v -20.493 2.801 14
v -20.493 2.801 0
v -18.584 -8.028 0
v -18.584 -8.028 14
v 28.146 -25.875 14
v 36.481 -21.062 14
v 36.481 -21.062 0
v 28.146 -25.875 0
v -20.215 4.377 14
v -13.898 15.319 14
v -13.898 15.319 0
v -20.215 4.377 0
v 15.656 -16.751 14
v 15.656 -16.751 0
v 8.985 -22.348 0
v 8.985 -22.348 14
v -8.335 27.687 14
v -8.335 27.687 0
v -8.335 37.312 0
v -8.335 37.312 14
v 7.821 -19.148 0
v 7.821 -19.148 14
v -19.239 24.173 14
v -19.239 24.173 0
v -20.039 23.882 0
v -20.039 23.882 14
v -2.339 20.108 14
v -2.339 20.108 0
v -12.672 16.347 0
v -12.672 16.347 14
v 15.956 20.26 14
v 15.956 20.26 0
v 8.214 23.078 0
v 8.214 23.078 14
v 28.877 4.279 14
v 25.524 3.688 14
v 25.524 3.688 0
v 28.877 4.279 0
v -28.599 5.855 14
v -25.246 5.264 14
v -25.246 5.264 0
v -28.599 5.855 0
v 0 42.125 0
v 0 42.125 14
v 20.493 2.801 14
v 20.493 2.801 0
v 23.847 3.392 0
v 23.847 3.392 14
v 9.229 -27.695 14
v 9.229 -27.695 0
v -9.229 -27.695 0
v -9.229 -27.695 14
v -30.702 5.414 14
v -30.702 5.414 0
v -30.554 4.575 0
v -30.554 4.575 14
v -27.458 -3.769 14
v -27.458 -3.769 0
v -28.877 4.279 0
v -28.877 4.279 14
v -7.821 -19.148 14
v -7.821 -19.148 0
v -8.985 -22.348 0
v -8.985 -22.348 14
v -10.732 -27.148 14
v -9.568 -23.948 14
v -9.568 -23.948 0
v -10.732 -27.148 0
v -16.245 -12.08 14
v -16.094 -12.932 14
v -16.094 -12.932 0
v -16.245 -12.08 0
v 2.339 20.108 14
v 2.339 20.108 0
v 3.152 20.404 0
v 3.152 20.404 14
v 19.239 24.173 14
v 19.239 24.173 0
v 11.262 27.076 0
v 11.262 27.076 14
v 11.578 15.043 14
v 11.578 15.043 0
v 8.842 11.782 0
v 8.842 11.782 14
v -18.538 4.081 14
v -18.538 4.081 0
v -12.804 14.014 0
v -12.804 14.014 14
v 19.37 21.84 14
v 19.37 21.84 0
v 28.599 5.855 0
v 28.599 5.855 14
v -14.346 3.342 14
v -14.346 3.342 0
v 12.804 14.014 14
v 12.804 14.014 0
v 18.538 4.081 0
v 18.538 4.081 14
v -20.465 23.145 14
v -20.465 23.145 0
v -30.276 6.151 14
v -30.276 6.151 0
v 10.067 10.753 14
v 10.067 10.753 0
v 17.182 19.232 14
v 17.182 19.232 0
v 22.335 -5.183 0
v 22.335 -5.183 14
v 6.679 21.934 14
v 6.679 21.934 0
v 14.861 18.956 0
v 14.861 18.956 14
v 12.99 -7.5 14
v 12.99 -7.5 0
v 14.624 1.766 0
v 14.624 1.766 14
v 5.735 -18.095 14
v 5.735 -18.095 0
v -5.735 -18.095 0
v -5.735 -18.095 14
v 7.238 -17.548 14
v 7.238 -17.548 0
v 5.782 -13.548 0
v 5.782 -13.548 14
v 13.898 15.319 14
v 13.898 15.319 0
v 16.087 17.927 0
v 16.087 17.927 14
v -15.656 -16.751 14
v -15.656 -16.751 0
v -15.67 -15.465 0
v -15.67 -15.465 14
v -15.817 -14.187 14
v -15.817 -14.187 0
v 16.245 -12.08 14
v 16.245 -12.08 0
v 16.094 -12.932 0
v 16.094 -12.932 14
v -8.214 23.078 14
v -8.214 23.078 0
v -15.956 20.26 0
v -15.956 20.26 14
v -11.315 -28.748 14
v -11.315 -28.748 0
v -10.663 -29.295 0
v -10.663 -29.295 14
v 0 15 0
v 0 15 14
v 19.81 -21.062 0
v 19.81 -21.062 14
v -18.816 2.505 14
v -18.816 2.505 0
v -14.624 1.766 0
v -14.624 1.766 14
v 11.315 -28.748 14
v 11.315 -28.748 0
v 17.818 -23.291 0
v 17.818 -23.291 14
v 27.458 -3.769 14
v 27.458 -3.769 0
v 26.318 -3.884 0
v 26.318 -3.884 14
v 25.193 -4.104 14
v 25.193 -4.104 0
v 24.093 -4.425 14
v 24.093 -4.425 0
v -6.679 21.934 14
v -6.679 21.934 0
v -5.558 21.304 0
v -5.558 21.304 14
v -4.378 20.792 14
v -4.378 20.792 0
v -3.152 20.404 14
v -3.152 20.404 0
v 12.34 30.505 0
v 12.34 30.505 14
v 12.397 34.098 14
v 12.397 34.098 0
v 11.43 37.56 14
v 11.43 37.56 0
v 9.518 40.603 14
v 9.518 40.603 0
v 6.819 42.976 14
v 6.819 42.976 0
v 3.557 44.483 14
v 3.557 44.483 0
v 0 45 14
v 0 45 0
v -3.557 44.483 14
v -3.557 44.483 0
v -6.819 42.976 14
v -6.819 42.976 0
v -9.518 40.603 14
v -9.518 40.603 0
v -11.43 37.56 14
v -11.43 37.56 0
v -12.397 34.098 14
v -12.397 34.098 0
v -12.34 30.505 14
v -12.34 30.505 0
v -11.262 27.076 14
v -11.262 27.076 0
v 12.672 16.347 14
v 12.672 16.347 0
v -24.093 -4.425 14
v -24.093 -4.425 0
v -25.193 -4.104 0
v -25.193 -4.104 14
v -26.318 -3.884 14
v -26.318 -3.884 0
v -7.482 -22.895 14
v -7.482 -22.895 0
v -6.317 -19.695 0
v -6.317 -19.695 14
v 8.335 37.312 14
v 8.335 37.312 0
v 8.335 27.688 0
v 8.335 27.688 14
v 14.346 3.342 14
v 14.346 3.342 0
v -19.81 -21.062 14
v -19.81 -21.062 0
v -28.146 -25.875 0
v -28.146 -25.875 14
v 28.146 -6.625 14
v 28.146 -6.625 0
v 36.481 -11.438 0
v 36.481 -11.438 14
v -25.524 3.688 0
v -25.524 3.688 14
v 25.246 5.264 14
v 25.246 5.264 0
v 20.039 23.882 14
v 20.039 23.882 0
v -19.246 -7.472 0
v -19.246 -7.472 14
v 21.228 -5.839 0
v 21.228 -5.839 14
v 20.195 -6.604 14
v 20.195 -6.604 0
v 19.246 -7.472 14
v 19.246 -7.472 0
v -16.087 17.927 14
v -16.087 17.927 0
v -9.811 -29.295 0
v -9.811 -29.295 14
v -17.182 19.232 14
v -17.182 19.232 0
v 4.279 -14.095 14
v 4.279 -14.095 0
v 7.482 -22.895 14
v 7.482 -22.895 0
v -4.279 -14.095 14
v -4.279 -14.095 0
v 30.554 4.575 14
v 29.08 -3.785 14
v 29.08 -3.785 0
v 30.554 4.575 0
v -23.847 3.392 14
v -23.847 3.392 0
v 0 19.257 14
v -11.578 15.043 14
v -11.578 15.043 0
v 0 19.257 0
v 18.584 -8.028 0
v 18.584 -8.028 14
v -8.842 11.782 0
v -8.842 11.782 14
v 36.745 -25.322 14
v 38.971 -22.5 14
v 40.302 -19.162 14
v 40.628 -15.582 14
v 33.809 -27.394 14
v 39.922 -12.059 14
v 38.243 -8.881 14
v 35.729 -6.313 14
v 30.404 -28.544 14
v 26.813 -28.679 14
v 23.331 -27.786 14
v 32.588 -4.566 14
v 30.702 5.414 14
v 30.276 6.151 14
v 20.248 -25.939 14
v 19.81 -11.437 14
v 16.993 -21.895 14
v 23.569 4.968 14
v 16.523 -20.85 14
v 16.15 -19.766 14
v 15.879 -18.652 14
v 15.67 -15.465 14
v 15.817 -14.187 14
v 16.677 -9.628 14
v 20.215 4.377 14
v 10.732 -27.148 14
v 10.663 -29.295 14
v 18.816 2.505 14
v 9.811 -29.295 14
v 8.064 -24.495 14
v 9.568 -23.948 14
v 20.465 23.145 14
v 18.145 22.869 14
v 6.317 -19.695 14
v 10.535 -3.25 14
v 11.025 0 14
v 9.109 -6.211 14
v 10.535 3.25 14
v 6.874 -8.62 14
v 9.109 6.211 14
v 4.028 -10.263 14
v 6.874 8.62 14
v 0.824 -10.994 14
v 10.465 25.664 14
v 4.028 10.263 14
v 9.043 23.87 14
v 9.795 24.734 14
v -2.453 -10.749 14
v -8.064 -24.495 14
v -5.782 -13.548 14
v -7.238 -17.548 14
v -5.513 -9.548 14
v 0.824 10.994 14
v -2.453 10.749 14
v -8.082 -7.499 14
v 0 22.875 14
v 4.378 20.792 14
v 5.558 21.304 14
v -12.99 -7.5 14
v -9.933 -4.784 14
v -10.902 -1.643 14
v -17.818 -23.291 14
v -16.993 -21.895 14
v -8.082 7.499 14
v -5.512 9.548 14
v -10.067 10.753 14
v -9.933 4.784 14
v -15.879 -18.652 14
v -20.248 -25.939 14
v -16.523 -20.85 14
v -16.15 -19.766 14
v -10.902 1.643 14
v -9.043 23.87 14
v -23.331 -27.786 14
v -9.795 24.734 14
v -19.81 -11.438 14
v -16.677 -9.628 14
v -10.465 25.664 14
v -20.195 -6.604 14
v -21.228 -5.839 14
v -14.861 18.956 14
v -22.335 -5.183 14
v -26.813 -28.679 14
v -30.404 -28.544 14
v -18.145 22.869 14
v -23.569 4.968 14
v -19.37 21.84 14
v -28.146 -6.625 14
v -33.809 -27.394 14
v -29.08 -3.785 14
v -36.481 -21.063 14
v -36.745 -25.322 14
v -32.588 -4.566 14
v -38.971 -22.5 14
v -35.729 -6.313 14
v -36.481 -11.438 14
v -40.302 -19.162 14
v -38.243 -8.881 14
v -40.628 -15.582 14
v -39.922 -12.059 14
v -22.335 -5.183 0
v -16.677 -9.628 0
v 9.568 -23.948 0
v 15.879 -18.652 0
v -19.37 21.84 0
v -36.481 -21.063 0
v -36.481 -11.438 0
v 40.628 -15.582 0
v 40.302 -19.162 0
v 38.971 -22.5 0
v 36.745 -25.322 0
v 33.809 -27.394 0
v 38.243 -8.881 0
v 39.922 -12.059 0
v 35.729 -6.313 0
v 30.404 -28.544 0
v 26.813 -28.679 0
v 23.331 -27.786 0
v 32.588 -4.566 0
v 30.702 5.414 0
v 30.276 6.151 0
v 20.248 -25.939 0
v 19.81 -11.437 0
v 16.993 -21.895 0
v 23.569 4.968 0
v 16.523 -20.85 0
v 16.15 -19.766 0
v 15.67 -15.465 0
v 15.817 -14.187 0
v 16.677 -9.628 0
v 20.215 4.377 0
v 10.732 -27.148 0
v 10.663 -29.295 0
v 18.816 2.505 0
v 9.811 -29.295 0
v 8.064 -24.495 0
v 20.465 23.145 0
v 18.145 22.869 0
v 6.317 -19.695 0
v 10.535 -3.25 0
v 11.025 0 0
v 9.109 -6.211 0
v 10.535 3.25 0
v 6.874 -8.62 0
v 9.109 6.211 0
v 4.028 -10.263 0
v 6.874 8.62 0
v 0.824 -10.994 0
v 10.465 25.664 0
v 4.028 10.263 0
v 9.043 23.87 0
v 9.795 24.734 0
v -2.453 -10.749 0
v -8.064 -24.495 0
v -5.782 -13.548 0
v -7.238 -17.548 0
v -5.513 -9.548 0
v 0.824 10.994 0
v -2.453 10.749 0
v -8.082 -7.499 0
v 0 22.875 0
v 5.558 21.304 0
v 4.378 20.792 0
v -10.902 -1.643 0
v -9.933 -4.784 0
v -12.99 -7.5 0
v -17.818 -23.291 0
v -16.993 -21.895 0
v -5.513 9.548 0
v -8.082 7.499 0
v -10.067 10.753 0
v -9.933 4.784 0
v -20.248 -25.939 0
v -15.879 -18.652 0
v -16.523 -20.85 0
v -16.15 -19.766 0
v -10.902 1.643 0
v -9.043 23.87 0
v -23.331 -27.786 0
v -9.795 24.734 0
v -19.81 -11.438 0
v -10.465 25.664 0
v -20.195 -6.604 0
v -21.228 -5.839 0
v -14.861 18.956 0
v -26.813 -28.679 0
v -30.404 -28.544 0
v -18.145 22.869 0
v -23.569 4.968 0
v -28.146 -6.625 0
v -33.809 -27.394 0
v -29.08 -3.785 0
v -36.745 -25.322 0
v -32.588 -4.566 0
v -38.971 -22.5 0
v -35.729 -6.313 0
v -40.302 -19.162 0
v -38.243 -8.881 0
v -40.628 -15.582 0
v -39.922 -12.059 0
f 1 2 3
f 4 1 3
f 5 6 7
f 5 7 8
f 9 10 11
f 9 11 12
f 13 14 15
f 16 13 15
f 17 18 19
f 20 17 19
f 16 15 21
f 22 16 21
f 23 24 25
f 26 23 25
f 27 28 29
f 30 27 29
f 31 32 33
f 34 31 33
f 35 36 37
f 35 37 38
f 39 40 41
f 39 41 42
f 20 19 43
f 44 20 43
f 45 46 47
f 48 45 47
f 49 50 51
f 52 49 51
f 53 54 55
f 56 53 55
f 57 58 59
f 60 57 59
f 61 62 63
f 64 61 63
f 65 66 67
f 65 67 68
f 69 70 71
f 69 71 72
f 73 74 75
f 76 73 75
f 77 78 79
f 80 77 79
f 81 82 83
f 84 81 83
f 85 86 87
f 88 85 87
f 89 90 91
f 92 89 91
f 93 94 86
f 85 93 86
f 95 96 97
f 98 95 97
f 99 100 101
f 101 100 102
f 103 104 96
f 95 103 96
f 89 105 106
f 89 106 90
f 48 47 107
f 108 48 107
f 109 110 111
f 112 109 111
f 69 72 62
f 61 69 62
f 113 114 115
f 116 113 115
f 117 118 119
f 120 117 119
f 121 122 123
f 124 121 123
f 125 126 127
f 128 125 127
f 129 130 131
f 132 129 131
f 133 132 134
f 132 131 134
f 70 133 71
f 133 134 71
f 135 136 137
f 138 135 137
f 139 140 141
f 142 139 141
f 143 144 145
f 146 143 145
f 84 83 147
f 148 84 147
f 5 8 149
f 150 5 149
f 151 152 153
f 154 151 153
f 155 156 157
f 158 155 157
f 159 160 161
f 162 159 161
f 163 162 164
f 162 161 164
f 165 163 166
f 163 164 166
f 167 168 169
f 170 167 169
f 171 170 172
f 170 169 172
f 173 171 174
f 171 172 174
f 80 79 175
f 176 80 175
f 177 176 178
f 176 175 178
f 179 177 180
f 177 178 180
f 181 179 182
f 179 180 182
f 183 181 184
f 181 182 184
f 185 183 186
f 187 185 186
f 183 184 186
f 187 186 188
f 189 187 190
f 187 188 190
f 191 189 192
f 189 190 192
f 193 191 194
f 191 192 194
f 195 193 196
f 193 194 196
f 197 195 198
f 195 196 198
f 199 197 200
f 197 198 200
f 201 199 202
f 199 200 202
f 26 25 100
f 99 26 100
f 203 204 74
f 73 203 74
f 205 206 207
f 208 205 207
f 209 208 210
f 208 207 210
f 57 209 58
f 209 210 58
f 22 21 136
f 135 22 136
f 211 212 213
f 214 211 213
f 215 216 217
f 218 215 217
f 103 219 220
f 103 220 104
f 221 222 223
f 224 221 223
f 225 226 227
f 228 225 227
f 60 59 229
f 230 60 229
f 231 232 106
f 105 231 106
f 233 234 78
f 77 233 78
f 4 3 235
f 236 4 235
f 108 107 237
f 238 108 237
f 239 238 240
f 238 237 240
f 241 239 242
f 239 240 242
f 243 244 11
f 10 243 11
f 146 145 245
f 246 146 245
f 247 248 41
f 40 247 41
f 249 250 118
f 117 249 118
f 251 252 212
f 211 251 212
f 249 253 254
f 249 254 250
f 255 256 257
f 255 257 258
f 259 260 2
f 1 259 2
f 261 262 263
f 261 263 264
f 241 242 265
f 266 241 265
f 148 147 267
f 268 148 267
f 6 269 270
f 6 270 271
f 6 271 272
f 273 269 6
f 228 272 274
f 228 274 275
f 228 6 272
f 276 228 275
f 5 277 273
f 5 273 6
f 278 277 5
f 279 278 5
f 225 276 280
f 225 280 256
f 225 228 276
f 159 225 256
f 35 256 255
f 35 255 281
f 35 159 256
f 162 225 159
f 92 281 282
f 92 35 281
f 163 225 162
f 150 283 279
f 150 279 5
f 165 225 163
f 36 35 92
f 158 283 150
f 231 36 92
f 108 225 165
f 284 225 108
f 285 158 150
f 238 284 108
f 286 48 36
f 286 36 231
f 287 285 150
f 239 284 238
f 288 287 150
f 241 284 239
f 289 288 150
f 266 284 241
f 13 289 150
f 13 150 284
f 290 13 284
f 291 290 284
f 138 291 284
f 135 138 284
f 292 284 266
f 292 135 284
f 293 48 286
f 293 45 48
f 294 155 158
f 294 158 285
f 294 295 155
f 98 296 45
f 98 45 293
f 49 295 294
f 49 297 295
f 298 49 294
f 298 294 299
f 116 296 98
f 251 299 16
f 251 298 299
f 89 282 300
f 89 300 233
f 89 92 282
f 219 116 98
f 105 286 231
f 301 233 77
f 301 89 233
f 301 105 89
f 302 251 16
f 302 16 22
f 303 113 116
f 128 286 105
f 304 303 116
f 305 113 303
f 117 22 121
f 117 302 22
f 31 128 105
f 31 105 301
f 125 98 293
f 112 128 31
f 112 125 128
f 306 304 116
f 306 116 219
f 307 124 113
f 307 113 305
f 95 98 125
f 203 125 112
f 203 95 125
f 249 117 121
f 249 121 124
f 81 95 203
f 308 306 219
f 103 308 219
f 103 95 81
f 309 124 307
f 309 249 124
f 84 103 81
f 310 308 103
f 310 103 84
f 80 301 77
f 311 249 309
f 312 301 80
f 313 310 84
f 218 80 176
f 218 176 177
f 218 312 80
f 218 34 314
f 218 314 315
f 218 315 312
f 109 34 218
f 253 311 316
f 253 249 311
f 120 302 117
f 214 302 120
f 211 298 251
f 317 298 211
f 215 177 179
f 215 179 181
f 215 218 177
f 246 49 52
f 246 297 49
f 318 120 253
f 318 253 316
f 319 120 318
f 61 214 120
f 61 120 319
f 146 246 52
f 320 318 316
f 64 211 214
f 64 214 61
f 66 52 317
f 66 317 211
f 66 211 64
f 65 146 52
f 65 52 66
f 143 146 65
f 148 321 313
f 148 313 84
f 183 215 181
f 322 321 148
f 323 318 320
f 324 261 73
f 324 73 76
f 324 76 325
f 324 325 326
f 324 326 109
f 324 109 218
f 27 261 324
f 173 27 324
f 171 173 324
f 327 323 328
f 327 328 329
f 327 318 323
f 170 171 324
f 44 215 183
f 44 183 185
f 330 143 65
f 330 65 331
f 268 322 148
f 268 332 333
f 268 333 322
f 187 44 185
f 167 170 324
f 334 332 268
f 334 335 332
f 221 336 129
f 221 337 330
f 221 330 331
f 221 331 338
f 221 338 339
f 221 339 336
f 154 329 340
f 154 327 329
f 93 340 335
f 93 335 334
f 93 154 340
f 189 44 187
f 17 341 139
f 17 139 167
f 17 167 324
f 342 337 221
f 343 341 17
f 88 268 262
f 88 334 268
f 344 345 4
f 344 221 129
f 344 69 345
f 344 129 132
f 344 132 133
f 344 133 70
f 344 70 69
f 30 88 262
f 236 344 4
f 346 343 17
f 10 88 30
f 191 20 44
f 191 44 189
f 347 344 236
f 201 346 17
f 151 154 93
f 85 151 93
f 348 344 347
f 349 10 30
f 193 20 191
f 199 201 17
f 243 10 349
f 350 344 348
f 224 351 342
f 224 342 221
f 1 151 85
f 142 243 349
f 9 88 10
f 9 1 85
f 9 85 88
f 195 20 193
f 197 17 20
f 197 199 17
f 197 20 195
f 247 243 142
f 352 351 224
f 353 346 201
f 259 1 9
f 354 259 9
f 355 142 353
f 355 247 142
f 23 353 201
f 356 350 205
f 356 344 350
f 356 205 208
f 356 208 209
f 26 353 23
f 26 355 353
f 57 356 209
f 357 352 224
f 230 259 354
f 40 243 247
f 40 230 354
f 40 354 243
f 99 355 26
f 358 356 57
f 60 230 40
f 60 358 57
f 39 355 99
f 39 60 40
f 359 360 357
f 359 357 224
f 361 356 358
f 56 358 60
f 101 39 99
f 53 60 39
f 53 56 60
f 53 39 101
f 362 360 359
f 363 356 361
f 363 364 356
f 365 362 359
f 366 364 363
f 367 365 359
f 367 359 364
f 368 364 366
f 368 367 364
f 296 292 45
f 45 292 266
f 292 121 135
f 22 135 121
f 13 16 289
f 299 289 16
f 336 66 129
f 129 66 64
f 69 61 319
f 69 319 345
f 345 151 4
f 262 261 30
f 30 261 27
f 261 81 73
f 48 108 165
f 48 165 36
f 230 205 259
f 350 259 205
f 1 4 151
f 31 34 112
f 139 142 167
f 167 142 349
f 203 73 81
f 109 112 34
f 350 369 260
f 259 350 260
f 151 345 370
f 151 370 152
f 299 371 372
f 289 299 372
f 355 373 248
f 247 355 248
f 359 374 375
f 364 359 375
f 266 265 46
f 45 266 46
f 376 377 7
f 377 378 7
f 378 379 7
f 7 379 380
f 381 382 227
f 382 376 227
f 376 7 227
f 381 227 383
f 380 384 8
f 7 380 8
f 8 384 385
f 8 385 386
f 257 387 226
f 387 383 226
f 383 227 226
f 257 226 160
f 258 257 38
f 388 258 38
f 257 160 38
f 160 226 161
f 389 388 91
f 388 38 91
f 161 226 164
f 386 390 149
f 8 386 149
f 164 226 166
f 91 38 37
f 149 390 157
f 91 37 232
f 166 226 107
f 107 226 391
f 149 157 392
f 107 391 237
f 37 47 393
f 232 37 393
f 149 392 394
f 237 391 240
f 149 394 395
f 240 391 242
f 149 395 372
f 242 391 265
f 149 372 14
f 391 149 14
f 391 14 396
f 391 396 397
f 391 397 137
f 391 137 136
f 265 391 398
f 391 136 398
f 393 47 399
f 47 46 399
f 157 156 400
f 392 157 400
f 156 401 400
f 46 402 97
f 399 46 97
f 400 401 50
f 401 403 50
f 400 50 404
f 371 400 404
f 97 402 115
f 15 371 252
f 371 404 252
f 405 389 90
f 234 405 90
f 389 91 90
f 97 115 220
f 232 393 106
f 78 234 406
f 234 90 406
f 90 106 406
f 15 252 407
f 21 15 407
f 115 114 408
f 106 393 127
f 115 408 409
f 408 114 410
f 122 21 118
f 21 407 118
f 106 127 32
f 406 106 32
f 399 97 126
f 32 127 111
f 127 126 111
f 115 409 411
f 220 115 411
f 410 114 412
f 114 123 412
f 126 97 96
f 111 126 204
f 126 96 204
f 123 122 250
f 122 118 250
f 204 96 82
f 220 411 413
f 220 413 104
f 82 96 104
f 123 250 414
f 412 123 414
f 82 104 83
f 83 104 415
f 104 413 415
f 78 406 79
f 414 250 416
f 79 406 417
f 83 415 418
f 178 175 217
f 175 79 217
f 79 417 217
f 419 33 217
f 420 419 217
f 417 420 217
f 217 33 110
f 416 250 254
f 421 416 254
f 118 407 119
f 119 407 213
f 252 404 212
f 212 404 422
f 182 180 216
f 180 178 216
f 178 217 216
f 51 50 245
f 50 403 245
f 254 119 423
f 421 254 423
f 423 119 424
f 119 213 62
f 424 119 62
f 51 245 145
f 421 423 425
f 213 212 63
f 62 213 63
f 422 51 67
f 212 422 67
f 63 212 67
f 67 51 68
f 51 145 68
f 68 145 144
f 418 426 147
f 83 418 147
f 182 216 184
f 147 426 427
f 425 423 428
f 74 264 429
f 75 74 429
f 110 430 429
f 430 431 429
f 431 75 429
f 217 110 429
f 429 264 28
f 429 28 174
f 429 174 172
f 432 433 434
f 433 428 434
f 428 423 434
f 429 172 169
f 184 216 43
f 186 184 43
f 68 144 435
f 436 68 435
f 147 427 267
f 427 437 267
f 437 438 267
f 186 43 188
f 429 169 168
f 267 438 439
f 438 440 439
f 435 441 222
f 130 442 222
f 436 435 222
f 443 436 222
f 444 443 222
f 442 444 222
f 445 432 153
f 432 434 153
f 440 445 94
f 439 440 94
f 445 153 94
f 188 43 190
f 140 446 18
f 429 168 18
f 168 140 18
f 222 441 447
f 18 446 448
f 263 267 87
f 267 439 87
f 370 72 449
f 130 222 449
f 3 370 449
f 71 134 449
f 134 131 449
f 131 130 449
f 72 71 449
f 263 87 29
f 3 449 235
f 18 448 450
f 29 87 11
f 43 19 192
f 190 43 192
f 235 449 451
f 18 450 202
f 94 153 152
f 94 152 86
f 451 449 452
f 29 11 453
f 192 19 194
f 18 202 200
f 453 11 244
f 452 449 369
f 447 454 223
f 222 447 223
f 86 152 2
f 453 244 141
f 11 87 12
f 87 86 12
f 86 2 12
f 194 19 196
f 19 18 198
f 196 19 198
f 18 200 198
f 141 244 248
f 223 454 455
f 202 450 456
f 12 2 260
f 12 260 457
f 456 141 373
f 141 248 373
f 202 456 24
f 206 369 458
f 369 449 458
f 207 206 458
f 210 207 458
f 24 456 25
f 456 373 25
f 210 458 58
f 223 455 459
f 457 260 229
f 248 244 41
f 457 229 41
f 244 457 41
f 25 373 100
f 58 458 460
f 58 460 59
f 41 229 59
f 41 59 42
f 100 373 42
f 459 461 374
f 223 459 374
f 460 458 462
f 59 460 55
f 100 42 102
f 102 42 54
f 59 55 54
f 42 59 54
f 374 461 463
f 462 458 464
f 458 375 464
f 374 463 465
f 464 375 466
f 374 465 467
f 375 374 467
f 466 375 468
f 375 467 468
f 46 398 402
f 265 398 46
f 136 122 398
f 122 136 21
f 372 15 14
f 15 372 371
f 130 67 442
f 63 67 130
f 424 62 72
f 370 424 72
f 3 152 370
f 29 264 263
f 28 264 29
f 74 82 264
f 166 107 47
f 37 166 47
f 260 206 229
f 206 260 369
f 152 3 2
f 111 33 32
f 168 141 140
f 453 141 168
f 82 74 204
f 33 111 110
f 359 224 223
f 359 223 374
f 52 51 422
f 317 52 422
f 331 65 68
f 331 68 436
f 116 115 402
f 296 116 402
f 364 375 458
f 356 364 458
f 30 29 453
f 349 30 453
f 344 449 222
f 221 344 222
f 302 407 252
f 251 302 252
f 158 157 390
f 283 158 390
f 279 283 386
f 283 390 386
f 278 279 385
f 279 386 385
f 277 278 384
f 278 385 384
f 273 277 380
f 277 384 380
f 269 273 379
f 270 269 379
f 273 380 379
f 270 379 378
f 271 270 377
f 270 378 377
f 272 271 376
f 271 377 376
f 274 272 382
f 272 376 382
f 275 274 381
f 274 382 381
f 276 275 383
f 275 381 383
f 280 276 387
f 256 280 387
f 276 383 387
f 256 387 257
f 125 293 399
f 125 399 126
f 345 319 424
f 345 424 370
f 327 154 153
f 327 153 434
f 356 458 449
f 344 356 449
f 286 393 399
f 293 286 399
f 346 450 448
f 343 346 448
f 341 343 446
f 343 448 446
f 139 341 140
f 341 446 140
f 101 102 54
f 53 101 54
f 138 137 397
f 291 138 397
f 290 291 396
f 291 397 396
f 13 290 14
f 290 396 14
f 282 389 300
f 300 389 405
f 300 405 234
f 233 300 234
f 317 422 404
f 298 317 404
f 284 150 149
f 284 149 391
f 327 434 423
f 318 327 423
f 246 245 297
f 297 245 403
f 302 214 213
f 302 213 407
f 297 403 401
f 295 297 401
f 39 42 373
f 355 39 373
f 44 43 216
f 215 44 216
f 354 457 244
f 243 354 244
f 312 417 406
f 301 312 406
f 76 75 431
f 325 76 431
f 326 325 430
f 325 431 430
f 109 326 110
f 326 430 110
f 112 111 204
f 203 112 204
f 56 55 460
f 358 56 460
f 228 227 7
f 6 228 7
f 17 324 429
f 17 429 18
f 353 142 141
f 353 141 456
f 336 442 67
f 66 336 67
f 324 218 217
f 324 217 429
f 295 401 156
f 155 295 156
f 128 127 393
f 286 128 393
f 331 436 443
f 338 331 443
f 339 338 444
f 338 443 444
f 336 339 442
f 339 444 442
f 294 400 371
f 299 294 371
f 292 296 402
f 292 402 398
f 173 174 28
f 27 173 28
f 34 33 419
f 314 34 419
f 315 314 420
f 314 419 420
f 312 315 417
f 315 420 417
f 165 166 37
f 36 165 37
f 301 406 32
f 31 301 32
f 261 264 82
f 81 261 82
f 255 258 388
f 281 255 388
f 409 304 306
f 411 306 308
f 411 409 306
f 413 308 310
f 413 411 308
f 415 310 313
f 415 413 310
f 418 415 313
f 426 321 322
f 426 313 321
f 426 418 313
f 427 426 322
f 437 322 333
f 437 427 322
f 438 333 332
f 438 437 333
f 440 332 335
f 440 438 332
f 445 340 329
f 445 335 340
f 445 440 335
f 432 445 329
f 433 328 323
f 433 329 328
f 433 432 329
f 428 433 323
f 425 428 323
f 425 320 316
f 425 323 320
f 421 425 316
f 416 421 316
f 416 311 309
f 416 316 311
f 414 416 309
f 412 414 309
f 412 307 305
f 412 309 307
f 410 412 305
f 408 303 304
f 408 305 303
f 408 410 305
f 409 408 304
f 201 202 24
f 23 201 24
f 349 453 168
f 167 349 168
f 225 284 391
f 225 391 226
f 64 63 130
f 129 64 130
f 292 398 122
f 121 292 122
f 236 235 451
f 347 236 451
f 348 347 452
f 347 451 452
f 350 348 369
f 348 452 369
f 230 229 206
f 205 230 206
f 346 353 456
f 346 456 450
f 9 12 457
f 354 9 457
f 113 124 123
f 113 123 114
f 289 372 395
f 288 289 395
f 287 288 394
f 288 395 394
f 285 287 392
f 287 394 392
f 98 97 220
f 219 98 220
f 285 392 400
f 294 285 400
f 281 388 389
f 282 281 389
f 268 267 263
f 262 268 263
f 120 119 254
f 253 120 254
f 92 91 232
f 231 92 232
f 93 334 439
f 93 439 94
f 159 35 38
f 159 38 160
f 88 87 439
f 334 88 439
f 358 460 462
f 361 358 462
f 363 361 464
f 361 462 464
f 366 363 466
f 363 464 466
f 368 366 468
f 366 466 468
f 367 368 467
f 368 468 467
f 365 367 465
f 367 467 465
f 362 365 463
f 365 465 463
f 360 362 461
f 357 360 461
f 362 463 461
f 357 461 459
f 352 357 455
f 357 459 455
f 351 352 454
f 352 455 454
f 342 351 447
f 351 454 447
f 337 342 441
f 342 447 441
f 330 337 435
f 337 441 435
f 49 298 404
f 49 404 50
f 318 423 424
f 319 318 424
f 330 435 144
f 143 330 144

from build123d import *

# Parameters (mm, degrees)
F0_R     = 12.5
F1_DEPTH = 14
F0_R_2   = 11.025
F2_COUNT = 3
F4_DEPTH = 14
F5_COUNT = 3


# Not quite as in the source:
# - a feature names something its author has since deleted; it is built from what else it names


with BuildPart() as f1:
    # F0 (on Top) → F1 (new body)
    with BuildSketch(Plane.XY):
        with Locations((0, 32.5)):
            Circle(F0_R)
        Polygon((8.3354945114, 37.3125), (8.3354945114, 27.6875), (0, 22.875), (-8.3354945114, 27.6875), (-8.3354945114, 37.3125), (0, 42.125), align=None, mode=Mode.SUBTRACT)
    extrude(amount=F1_DEPTH)


with BuildPart() as f1b:
    # F0 (on Top) → F1, piece 2 (new body)
    with BuildSketch(Plane.XY):
        Polygon((9.6418141453, 11.4906666468), (0, 15), (-9.6418141453, 11.4906666468), (-14.7721162952, 2.604722665), (-12.9903810568, -7.5), (-5.1303021499, -14.0953893118), (5.1303021499, -14.0953893118), (12.9903810568, -7.5), (14.7721162952, 2.604722665), align=None)
        Circle(F0_R_2, mode=Mode.SUBTRACT)
    extrude(amount=F1_DEPTH)


with BuildPart() as f2_1:
    # F2: instance of F1
    add(f1.part.rotate(Axis((0, 0, 0), (0, 0, -1)), 1 * 360 / F2_COUNT))


with BuildPart() as f2_2:
    # F2: instance of F1
    add(f1.part.rotate(Axis((0, 0, 0), (0, 0, -1)), 2 * 360 / F2_COUNT))


with BuildPart() as f1_1:
    add(f1.part)

    add(f1b.part)  # F4 merges F1b

    add(f2_2.part)  # F4 merges F2_2
    # F3 (on Top) → F4 (join, through all)
    with BuildSketch(Plane.XY):
        Polygon((-14.3464451862, 3.3420066531), (-18.5384872699, 4.0811767767), (-18.9641583789, 3.3438927886), (-18.8163243541, 2.5054843719), (-14.6242822705, 1.7663142483), (-14.7721162952, 2.604722665), align=None)
        Polygon((-8.8418141453, 11.7818428342), (-11.5779752919, 15.0426727106), (-12.3779752919, 14.7514965232), (-12.8036464009, 14.0142125351), (-10.0674852543, 10.7533826587), (-9.6418141453, 11.4906666468), align=None)
        Polygon((-18.9641583789, 3.3438927886), (-18.5384872699, 4.0811767767), (-20.2153041033, 4.3768448262), (-20.6409752123, 3.6395608381), (-20.4931411876, 2.8011524213), (-18.8163243541, 2.5054843719), align=None)
        Polygon((-12.3779752919, 14.7514965232), (-11.5779752919, 15.0426727106), (-12.6724397505, 16.3470046611), (-13.4724397505, 16.0558284737), (-13.8981108595, 15.3185444856), (-12.8036464009, 14.0142125351), align=None)
        Polygon((-13.4724397505, 16.0558284737), (-12.6724397505, 16.3470046611), (-14.8613686678, 18.9556685622), (-15.6613686678, 18.6644923748), (-16.0870397768, 17.9272083867), (-13.8981108595, 15.3185444856), align=None)
        Polygon((-20.6409752123, 3.6395608381), (-20.2153041033, 4.3768448262), (-23.5689377703, 4.968180925), (-23.9946088793, 4.230896937), (-23.8467748545, 3.3924885202), (-20.4931411876, 2.8011524213), align=None)
        Polygon((-23.5689377703, 4.968180925), (-25.2457546037, 5.2638489745), (-25.6714257127, 4.5265649864), (-25.523591688, 3.6881565697), (-23.8467748545, 3.3924885202), (-23.9946088793, 4.230896937), align=None)
        Polygon((-14.8613686678, 18.9556685622), (-15.9558331265, 20.2600005128), (-16.7558331265, 19.9688243254), (-17.1815042355, 19.2315403373), (-16.0870397768, 17.9272083867), (-15.6613686678, 18.6644923748), align=None)
        Polygon((-15.9558331265, 20.2600005128), (-18.1447620438, 22.8686644139), (-18.9447620438, 22.5774882265), (-19.3704331527, 21.8402042384), (-17.1815042355, 19.2315403373), (-16.7558331265, 19.9688243254), align=None)
        Polygon((-25.2457546037, 5.2638489745), (-28.5993882707, 5.8551850734), (-29.0250593797, 5.1179010853), (-28.8772253549, 4.2794926686), (-25.523591688, 3.6881565697), (-25.6714257127, 4.5265649864), align=None)
        Polygon((-28.5993882707, 5.8551850734), (-30.2762051041, 6.1508531228), (-30.7018762131, 5.4135691347), (-30.5540421884, 4.575160718), (-28.8772253549, 4.2794926686), (-29.0250593797, 5.1179010853), align=None)
        Polygon((-18.1447620438, 22.8686644139), (-19.2392265024, 24.1729963645), (-20.0392265024, 23.881820177), (-20.4648976114, 23.144536189), (-19.3704331527, 21.8402042384), (-18.9447620438, 22.5774882265), align=None)
        with BuildLine():
            ThreePointArc((-10.4650421032, 25.6638538798), (-10.8865068143, 26.3572018279), (-11.262100915, 27.0764326333))
            Line((-11.262100915, 27.0764326333), (-19.2392265024, 24.1729963645))
            Line((-19.2392265024, 24.1729963645), (-18.1447620438, 22.8686644139))
            Line((-18.1447620438, 22.8686644139), (-10.4650421032, 25.6638538798))
        make_face()
        Polygon((-19.3704331527, 21.8402042384), (-20.4648976114, 23.144536189), (-30.2762051041, 6.1508531228), (-28.5993882707, 5.8551850734), align=None)
        Polygon((-16.0870397768, 17.9272083867), (-17.1815042355, 19.2315403373), (-25.2457546037, 5.2638489745), (-23.5689377703, 4.968180925), align=None)
        with BuildLine():
            ThreePointArc((-6.6788350915, 21.9338672249), (-7.4683996582, 22.4763775737), (-8.2140988038, 23.0777613678))
            Line((-8.2140988038, 23.0777613678), (-15.9558331265, 20.2600005128))
            Line((-15.9558331265, 20.2600005128), (-14.8613686678, 18.9556685622))
            Line((-14.8613686678, 18.9556685622), (-6.6788350915, 21.9338672249))
        make_face()
        with BuildLine():
            Line((-11.5779752919, 15.0426727106), (3.1518577067, 20.4038934778))
            ThreePointArc((3.1518577067, 20.4038934778), (0.5214979159, 20.0108831408), (-2.1324694589, 20.1832401173))
            Line((-2.1324694589, 20.1832401173), (-12.6724397505, 16.3470046611))
            Line((-12.6724397505, 16.3470046611), (-11.5779752919, 15.0426727106))
        make_face()
        Polygon((-18.5384872699, 4.0811767767), (-12.8036464009, 14.0142125351), (-13.8981108595, 15.3185444856), (-20.2153041033, 4.3768448262), align=None)
        with BuildLine():
            Line((-28.8772253549, 4.2794926686), (-30.5540421884, 4.575160718))
            Line((-30.5540421884, 4.575160718), (-29.0799289618, -3.7849508243))
            ThreePointArc((-29.0799289618, -3.7849508243), (-28.2692597628, -3.7506094543), (-27.4580704705, -3.7689346268))
            Line((-27.4580704705, -3.7689346268), (-28.8772253549, 4.2794926686))
        make_face()
        with BuildLine():
            Line((-23.8467748545, 3.3924885202), (-25.523591688, 3.6881565697))
            Line((-25.523591688, 3.6881565697), (-24.0929770089, -4.4252624506))
            ThreePointArc((-24.0929770089, -4.4252624506), (-23.199313793, -4.7703649572), (-22.3347037658, -5.1828927555))
            Line((-22.3347037658, -5.1828927555), (-23.8467748545, 3.3924885202))
        make_face()
        with BuildLine():
            Line((-16.0943612345, -12.931535582), (-18.8163243541, 2.5054843719))
            Line((-18.8163243541, 2.5054843719), (-20.4931411876, 2.8011524213))
            Line((-20.4931411876, 2.8011524213), (-18.5454334017, -8.2448473345))
            ThreePointArc((-18.5454334017, -8.2448473345), (-17.0691841941, -10.4570720136), (-16.0943612345, -12.931535582))
        make_face()
    extrude(amount=F4_DEPTH)



with BuildPart() as f1_2:
    add(f1_1.part)

    add(f2_1.part)  # F5 merges F2_1
    # F5: F1 ×3 about axis
    f5_axis = Axis((0, 0, 0), (0, 0, -1))
    for i in range(1, F5_COUNT):
        add(f1_1.part.rotate(f5_axis, i * 360 / F5_COUNT))


solid = f1_2.part
